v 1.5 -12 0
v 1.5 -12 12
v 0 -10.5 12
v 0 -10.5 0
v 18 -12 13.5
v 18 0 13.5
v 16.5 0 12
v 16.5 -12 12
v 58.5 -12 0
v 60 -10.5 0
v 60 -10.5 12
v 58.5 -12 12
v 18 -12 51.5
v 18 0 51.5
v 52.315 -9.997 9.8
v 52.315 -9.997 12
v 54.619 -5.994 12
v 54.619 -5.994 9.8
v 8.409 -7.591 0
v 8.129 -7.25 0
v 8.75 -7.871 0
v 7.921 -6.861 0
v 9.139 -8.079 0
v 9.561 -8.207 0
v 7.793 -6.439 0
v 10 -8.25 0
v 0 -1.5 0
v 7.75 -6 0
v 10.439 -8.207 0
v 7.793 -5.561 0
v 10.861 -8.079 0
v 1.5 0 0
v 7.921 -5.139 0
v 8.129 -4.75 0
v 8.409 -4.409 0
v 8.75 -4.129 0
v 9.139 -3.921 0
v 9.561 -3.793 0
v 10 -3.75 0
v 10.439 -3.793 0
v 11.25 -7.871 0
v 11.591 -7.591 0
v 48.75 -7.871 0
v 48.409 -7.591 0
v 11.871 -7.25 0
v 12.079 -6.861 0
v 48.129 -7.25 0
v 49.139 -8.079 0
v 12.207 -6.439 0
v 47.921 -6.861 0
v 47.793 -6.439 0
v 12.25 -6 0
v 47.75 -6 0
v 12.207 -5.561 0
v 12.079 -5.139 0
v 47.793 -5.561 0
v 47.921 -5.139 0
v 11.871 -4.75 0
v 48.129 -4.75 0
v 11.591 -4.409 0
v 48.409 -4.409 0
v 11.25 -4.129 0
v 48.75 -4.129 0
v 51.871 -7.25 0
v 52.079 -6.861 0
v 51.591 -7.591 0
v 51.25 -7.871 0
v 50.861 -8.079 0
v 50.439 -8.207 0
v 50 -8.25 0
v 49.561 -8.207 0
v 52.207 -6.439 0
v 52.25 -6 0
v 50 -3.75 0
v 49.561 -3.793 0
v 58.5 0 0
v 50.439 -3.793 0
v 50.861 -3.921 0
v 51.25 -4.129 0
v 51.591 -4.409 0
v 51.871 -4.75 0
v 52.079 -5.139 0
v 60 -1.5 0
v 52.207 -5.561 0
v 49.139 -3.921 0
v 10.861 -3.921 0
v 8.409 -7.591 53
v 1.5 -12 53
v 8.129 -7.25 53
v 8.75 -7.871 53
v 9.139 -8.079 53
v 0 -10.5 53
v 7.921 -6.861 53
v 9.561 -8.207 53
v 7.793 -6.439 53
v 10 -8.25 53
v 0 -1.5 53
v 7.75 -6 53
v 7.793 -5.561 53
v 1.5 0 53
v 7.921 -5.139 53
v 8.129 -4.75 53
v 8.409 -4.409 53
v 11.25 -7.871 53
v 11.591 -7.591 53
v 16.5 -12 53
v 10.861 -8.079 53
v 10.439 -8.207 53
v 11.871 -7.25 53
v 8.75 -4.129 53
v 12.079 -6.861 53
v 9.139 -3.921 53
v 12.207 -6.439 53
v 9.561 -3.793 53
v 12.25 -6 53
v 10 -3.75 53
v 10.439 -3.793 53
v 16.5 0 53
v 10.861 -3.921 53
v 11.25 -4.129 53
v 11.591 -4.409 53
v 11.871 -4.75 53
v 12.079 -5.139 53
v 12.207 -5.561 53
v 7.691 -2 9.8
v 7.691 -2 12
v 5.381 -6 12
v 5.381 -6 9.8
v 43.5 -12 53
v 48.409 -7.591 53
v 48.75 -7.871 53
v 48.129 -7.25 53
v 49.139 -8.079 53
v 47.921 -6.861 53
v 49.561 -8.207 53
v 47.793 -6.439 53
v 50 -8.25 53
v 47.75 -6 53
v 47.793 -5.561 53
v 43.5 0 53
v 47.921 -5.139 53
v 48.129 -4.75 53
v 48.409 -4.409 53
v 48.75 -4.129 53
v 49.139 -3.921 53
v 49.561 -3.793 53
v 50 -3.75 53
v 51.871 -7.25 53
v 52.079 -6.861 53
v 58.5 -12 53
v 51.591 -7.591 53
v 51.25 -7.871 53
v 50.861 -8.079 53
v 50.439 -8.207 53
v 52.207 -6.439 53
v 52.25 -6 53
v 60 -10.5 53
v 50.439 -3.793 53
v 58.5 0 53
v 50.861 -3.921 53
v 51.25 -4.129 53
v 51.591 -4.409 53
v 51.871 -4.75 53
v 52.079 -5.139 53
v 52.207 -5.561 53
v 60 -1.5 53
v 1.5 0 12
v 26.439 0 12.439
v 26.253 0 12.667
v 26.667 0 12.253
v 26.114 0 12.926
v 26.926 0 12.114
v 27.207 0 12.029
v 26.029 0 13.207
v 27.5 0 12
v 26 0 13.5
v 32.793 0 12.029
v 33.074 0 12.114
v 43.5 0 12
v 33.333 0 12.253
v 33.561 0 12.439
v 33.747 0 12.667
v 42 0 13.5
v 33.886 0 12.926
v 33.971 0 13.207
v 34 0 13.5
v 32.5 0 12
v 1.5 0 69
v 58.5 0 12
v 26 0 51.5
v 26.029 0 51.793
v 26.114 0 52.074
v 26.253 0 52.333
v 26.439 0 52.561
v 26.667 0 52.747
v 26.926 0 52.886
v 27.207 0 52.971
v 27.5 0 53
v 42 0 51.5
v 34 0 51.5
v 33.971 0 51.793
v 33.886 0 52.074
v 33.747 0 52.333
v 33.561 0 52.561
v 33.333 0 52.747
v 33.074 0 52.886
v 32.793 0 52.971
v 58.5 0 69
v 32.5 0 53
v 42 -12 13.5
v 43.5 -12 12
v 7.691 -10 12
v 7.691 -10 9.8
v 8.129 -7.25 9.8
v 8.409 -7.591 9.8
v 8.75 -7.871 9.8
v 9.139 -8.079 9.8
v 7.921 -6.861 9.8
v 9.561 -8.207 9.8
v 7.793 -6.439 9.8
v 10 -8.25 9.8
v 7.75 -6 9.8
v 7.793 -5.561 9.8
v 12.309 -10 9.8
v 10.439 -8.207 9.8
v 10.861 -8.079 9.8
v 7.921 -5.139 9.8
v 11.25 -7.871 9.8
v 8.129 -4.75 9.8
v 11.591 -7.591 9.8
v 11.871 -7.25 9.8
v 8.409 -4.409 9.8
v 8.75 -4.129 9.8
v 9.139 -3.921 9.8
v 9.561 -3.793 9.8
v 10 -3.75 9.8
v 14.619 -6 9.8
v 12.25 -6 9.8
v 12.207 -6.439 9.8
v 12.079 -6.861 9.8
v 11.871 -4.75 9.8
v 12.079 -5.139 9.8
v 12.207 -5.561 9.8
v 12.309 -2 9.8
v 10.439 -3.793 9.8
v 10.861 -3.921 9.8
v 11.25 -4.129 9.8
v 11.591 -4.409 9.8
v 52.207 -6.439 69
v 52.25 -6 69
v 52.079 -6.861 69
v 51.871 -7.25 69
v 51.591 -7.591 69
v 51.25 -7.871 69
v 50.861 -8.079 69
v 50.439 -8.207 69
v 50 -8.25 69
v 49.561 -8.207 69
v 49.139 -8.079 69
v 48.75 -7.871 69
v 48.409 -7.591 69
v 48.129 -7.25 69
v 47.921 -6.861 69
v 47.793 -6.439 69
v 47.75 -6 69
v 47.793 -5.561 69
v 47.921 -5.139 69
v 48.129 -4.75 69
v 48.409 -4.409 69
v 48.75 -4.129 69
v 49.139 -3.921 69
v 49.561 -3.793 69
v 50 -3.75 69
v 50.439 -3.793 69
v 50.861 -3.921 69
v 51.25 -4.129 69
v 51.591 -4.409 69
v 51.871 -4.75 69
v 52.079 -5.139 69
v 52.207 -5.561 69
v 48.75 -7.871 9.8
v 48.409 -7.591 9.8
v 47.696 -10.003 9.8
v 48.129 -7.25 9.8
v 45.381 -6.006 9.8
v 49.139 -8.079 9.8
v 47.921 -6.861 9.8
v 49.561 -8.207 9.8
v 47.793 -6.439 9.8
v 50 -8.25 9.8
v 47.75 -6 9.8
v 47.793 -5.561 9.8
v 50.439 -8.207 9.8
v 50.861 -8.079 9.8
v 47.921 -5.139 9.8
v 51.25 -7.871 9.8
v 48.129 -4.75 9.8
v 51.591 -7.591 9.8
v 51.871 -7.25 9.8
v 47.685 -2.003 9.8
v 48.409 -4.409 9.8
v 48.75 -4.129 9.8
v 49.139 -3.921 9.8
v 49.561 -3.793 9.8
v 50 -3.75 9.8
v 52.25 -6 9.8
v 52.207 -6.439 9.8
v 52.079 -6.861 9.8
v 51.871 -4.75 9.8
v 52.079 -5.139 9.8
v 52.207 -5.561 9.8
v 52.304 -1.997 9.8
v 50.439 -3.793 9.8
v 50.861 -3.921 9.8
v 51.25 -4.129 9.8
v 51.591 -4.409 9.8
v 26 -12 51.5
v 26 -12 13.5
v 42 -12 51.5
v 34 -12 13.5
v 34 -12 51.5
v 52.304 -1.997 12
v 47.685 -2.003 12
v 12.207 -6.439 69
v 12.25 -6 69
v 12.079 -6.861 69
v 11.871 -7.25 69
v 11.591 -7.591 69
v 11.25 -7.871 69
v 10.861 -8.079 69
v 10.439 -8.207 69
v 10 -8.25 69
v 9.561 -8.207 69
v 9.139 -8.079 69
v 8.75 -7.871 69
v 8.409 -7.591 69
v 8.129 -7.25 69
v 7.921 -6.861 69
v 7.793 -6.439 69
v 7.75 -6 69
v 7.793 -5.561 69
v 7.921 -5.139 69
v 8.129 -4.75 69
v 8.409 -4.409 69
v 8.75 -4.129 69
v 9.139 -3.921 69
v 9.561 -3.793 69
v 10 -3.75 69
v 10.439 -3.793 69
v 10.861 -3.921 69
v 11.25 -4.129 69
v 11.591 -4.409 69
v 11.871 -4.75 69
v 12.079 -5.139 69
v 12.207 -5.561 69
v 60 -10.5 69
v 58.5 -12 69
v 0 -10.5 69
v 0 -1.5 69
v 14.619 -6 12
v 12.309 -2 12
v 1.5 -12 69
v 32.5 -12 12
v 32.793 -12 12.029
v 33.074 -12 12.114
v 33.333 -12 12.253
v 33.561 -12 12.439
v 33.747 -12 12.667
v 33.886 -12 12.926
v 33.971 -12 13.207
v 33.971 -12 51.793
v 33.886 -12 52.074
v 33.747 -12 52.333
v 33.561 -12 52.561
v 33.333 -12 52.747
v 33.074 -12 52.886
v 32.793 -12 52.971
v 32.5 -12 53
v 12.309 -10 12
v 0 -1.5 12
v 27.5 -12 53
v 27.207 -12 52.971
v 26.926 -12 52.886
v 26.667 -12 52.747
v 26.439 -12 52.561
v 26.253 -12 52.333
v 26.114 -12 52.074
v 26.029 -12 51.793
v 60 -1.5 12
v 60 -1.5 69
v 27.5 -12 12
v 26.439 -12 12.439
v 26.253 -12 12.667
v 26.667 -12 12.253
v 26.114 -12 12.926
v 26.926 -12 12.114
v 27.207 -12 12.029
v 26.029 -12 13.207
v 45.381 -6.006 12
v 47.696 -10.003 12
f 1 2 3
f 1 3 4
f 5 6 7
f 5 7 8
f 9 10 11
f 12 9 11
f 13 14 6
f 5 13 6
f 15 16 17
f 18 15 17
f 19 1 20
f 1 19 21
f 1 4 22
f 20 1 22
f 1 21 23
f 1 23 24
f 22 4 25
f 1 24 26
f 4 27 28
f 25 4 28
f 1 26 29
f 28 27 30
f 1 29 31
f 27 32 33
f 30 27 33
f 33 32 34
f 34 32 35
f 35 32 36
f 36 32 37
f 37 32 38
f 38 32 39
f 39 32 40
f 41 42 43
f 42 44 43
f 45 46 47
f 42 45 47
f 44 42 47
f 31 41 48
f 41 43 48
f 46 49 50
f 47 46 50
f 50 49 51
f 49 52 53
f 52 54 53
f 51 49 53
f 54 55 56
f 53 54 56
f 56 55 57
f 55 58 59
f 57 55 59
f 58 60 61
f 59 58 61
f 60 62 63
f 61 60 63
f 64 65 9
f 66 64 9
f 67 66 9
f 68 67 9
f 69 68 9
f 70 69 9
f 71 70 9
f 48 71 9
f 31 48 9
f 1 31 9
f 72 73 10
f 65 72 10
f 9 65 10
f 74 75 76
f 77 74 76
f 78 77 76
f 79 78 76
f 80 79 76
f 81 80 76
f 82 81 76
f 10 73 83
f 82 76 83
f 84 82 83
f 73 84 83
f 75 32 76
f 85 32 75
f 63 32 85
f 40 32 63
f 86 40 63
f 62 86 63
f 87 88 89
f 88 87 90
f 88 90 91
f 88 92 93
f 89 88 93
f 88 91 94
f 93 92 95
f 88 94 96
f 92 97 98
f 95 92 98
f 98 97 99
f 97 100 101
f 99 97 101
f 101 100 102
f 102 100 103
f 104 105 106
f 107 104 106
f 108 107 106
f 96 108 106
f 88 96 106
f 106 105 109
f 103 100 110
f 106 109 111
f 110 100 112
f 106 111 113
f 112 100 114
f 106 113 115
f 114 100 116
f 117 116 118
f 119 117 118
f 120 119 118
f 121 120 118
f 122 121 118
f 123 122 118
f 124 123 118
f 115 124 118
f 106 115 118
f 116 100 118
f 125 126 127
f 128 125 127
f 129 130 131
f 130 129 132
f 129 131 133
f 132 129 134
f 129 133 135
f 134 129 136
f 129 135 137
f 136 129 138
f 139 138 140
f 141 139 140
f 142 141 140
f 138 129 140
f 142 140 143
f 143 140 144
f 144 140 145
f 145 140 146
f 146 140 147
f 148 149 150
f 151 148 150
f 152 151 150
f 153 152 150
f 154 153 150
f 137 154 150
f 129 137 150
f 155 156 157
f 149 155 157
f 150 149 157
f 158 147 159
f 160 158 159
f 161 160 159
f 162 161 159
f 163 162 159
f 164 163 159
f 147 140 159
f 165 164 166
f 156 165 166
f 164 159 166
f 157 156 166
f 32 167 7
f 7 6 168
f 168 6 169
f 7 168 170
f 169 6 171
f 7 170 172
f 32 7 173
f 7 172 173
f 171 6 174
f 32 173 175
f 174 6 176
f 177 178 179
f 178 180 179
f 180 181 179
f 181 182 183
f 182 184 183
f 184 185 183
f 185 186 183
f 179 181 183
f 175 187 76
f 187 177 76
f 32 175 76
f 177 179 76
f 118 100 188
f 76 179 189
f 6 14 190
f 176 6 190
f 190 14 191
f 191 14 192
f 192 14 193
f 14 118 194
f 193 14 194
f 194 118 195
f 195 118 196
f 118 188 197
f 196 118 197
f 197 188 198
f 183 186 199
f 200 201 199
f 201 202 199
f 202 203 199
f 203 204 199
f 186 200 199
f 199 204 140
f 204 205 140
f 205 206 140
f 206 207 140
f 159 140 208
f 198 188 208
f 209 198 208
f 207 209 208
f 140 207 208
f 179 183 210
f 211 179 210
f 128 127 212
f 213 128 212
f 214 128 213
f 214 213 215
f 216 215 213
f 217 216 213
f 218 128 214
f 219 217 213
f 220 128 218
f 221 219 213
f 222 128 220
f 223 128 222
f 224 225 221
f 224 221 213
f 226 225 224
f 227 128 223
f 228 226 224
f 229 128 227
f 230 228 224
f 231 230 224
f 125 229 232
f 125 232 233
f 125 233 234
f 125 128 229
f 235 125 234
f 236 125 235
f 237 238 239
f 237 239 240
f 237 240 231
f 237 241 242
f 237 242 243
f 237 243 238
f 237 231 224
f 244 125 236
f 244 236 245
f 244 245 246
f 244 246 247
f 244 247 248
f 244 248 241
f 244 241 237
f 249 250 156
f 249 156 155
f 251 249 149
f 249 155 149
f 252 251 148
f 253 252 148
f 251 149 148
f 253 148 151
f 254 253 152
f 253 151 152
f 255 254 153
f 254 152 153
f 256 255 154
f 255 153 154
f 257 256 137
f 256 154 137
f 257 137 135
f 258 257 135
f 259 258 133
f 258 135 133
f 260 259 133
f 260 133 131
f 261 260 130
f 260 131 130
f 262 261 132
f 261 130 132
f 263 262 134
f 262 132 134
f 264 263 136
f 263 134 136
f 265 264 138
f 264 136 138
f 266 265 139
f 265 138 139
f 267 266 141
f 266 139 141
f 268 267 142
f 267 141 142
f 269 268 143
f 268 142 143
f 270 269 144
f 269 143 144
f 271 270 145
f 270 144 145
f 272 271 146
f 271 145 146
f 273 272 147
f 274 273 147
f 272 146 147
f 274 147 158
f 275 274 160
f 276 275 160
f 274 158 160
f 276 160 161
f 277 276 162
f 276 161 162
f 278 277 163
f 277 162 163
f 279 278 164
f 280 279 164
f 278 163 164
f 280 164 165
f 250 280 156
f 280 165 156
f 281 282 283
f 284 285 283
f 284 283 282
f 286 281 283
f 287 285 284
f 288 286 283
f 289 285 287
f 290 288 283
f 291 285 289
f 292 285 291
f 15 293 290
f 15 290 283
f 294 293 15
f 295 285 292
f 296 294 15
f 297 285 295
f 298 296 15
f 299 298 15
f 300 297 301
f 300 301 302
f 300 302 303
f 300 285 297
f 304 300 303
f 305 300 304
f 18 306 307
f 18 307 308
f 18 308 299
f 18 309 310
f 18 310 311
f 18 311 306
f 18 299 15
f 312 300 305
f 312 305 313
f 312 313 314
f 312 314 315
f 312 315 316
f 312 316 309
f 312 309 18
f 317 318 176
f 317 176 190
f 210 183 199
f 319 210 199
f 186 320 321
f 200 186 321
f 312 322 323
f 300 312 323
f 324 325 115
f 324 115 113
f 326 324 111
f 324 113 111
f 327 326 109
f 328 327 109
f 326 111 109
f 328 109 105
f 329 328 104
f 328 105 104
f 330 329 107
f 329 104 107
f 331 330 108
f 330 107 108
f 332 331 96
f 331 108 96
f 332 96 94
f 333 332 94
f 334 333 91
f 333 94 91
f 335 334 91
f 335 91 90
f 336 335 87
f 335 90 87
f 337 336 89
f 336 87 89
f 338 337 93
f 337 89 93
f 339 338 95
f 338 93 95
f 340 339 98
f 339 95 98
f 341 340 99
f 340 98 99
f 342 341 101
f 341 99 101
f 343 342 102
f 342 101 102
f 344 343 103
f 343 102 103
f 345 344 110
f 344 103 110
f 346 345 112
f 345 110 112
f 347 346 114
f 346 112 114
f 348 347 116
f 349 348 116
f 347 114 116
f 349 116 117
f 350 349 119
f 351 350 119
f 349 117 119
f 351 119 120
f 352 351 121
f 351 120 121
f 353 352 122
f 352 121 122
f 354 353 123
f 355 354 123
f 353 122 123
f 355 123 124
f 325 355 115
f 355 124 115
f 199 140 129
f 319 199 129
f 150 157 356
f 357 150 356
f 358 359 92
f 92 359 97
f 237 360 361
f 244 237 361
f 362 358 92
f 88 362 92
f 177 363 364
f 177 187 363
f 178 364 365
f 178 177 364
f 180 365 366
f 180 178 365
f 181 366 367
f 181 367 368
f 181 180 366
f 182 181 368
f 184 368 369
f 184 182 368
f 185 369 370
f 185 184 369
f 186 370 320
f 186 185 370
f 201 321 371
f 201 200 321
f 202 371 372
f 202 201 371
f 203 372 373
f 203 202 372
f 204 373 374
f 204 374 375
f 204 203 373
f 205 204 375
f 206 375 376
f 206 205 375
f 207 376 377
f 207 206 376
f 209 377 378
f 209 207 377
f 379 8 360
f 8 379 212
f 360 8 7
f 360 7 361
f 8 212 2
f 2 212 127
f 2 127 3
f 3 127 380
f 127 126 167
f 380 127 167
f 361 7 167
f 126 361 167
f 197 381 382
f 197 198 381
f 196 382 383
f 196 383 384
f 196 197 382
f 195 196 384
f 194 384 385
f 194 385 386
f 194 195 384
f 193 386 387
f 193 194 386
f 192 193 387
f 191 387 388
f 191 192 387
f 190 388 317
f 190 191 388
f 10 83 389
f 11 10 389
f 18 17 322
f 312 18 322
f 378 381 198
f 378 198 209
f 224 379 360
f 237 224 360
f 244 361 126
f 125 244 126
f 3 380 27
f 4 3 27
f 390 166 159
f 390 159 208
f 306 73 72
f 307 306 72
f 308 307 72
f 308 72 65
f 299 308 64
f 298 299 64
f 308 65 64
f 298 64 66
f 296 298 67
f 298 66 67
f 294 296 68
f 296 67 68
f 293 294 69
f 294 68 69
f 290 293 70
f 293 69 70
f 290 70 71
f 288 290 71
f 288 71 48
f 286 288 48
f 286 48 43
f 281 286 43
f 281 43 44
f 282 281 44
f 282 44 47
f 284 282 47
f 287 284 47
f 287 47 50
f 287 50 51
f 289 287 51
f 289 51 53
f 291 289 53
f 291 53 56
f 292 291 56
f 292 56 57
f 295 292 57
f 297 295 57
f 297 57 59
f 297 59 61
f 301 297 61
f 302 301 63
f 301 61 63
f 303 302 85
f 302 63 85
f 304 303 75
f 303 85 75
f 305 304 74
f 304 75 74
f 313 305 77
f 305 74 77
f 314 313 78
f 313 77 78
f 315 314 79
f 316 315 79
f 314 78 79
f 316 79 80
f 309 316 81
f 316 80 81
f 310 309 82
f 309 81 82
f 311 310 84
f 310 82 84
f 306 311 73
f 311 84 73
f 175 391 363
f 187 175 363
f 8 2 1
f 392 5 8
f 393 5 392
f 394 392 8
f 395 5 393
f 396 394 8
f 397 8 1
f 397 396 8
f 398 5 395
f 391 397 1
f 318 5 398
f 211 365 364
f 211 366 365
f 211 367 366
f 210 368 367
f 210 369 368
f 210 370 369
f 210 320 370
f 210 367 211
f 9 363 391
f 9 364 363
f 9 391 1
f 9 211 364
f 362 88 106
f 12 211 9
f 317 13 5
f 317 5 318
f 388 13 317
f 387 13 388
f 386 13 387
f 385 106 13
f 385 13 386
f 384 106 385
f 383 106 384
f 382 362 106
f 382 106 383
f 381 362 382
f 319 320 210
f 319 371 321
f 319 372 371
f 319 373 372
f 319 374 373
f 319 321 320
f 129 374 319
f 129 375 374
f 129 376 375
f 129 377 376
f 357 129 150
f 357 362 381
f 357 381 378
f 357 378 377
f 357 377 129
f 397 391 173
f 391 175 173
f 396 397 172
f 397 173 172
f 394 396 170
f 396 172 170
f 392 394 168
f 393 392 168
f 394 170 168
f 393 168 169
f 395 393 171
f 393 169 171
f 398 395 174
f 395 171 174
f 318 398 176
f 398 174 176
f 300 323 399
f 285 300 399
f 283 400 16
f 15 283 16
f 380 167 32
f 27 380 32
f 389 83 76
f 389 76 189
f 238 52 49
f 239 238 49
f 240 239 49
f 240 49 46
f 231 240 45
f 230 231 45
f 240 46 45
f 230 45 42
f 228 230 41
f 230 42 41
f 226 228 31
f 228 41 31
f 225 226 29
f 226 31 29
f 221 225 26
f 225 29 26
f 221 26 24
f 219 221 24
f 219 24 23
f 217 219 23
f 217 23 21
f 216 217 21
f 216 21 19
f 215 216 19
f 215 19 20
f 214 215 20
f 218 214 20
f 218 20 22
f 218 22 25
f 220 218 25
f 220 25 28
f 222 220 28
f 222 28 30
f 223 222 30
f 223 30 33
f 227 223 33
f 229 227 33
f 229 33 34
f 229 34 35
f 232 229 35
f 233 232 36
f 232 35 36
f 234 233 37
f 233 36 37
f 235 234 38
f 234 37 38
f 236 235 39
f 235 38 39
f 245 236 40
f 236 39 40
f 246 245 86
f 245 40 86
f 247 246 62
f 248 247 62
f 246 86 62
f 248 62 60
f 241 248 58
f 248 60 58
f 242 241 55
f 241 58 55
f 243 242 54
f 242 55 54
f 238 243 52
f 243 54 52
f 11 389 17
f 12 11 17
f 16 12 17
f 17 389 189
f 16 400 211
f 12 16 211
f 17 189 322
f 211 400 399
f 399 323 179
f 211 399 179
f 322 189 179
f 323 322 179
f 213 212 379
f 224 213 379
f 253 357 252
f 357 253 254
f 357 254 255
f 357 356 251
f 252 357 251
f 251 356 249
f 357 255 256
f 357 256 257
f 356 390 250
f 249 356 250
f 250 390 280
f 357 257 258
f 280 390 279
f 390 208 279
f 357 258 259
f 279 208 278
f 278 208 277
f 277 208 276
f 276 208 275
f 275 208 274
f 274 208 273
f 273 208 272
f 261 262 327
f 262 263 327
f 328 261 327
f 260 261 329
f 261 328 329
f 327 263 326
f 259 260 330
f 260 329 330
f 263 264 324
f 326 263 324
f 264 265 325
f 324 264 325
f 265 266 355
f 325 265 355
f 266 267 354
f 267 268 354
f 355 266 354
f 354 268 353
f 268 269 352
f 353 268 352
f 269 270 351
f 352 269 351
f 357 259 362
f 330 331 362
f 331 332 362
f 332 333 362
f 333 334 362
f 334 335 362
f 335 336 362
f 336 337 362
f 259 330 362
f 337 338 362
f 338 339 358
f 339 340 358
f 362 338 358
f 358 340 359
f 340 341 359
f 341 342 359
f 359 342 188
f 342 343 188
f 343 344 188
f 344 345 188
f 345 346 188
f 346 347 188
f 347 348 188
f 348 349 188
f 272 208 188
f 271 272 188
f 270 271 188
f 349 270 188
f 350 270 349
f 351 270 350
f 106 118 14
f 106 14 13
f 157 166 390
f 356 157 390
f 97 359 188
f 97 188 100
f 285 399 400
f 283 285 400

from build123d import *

# Parameters (mm, degrees)
F1_DEPTH  = 12
F2_R      = 2.25
F3_DEPTH  = 16
F4_SIZE   = 1.5
F5_W      = 8
F5_H      = 41
F6_DEPTH  = 12.001
F7_R      = 1.5
F8_R      = 2.25
F9_DEPTH  = 12
F11_DEPTH = 2.2


with BuildPart() as f1:
    # F0 (on Front) → F1 (new body)
    with BuildSketch(Plane.XZ):
        Polygon((0, 12), (0, 0), (60, 0), (60, 12), (42, 12), (42, 53), (60, 53), (60, 69), (0, 69), (0, 53), (18, 53), (18, 12), align=None)
    extrude(amount=F1_DEPTH)

    # F2 (on face) → F3 (cut, through all)
    with BuildSketch(Plane(origin=(0, 0, 53), x_dir=(1, 0, 0), z_dir=(0, 0, -1))):
        with Locations((10, 6)):
            Circle(F2_R)
        with Locations((50, 6)):
            Circle(F2_R)
    extrude(amount=-F3_DEPTH, mode=Mode.SUBTRACT)

    # F4
    f4_edges = [f1.edges().sort_by_distance(p)[0] for p in [
        (60, -12, 61),
        (60, -12, 6),
        (60, 0, 6),
        (60, 0, 61),
        (0, -12, 61),
        (0, 0, 61),
        (0, 0, 6),
        (0, -12, 6),
        (18, -6, 12),
        (18, -6, 53),
        (42, -6, 53),
        (42, -6, 12),
    ]]
    chamfer(f4_edges, length=F4_SIZE)

    # F5 (on face) → F6 (cut, through all)
    with BuildSketch(Plane.XZ.offset(12)):
        with Locations((30, 32.5)):
            Rectangle(F5_W, F5_H)
    extrude(amount=-F6_DEPTH, mode=Mode.SUBTRACT)

    # F7
    f7_edges = [f1.edges().sort_by_distance(p)[0] for p in [
        (26, -6, 53),
        (34, -6, 53),
        (34, -6, 12),
        (26, -6, 12),
    ]]
    fillet(f7_edges, radius=F7_R)

    # F8 (on face) → F9 (cut, through all)
    with BuildSketch(Plane(origin=(0, 0, 0), x_dir=(1, 0, 0), z_dir=(0, 0, -1))):
        with Locations((50, 6)):
            Circle(F8_R)
        with Locations((10, 6)):
            Circle(F8_R)
    extrude(amount=-F9_DEPTH, mode=Mode.SUBTRACT)

    # F10 (on face) → F11 (cut)
    with BuildSketch(Plane.XY.offset(12)):
        Polygon((7.690599, -10), (12.309401, -10), (14.618802, -6), (12.309401, -2), (7.690599, -2), (5.381198, -6), align=None)
        Polygon((52.314719, -9.996925), (54.618798, -5.993857), (52.304079, -1.996932), (47.685281, -2.003075), (45.381202, -6.006143), (47.695921, -10.003068), align=None)
    extrude(amount=-F11_DEPTH, mode=Mode.SUBTRACT)


solid = f1.part
